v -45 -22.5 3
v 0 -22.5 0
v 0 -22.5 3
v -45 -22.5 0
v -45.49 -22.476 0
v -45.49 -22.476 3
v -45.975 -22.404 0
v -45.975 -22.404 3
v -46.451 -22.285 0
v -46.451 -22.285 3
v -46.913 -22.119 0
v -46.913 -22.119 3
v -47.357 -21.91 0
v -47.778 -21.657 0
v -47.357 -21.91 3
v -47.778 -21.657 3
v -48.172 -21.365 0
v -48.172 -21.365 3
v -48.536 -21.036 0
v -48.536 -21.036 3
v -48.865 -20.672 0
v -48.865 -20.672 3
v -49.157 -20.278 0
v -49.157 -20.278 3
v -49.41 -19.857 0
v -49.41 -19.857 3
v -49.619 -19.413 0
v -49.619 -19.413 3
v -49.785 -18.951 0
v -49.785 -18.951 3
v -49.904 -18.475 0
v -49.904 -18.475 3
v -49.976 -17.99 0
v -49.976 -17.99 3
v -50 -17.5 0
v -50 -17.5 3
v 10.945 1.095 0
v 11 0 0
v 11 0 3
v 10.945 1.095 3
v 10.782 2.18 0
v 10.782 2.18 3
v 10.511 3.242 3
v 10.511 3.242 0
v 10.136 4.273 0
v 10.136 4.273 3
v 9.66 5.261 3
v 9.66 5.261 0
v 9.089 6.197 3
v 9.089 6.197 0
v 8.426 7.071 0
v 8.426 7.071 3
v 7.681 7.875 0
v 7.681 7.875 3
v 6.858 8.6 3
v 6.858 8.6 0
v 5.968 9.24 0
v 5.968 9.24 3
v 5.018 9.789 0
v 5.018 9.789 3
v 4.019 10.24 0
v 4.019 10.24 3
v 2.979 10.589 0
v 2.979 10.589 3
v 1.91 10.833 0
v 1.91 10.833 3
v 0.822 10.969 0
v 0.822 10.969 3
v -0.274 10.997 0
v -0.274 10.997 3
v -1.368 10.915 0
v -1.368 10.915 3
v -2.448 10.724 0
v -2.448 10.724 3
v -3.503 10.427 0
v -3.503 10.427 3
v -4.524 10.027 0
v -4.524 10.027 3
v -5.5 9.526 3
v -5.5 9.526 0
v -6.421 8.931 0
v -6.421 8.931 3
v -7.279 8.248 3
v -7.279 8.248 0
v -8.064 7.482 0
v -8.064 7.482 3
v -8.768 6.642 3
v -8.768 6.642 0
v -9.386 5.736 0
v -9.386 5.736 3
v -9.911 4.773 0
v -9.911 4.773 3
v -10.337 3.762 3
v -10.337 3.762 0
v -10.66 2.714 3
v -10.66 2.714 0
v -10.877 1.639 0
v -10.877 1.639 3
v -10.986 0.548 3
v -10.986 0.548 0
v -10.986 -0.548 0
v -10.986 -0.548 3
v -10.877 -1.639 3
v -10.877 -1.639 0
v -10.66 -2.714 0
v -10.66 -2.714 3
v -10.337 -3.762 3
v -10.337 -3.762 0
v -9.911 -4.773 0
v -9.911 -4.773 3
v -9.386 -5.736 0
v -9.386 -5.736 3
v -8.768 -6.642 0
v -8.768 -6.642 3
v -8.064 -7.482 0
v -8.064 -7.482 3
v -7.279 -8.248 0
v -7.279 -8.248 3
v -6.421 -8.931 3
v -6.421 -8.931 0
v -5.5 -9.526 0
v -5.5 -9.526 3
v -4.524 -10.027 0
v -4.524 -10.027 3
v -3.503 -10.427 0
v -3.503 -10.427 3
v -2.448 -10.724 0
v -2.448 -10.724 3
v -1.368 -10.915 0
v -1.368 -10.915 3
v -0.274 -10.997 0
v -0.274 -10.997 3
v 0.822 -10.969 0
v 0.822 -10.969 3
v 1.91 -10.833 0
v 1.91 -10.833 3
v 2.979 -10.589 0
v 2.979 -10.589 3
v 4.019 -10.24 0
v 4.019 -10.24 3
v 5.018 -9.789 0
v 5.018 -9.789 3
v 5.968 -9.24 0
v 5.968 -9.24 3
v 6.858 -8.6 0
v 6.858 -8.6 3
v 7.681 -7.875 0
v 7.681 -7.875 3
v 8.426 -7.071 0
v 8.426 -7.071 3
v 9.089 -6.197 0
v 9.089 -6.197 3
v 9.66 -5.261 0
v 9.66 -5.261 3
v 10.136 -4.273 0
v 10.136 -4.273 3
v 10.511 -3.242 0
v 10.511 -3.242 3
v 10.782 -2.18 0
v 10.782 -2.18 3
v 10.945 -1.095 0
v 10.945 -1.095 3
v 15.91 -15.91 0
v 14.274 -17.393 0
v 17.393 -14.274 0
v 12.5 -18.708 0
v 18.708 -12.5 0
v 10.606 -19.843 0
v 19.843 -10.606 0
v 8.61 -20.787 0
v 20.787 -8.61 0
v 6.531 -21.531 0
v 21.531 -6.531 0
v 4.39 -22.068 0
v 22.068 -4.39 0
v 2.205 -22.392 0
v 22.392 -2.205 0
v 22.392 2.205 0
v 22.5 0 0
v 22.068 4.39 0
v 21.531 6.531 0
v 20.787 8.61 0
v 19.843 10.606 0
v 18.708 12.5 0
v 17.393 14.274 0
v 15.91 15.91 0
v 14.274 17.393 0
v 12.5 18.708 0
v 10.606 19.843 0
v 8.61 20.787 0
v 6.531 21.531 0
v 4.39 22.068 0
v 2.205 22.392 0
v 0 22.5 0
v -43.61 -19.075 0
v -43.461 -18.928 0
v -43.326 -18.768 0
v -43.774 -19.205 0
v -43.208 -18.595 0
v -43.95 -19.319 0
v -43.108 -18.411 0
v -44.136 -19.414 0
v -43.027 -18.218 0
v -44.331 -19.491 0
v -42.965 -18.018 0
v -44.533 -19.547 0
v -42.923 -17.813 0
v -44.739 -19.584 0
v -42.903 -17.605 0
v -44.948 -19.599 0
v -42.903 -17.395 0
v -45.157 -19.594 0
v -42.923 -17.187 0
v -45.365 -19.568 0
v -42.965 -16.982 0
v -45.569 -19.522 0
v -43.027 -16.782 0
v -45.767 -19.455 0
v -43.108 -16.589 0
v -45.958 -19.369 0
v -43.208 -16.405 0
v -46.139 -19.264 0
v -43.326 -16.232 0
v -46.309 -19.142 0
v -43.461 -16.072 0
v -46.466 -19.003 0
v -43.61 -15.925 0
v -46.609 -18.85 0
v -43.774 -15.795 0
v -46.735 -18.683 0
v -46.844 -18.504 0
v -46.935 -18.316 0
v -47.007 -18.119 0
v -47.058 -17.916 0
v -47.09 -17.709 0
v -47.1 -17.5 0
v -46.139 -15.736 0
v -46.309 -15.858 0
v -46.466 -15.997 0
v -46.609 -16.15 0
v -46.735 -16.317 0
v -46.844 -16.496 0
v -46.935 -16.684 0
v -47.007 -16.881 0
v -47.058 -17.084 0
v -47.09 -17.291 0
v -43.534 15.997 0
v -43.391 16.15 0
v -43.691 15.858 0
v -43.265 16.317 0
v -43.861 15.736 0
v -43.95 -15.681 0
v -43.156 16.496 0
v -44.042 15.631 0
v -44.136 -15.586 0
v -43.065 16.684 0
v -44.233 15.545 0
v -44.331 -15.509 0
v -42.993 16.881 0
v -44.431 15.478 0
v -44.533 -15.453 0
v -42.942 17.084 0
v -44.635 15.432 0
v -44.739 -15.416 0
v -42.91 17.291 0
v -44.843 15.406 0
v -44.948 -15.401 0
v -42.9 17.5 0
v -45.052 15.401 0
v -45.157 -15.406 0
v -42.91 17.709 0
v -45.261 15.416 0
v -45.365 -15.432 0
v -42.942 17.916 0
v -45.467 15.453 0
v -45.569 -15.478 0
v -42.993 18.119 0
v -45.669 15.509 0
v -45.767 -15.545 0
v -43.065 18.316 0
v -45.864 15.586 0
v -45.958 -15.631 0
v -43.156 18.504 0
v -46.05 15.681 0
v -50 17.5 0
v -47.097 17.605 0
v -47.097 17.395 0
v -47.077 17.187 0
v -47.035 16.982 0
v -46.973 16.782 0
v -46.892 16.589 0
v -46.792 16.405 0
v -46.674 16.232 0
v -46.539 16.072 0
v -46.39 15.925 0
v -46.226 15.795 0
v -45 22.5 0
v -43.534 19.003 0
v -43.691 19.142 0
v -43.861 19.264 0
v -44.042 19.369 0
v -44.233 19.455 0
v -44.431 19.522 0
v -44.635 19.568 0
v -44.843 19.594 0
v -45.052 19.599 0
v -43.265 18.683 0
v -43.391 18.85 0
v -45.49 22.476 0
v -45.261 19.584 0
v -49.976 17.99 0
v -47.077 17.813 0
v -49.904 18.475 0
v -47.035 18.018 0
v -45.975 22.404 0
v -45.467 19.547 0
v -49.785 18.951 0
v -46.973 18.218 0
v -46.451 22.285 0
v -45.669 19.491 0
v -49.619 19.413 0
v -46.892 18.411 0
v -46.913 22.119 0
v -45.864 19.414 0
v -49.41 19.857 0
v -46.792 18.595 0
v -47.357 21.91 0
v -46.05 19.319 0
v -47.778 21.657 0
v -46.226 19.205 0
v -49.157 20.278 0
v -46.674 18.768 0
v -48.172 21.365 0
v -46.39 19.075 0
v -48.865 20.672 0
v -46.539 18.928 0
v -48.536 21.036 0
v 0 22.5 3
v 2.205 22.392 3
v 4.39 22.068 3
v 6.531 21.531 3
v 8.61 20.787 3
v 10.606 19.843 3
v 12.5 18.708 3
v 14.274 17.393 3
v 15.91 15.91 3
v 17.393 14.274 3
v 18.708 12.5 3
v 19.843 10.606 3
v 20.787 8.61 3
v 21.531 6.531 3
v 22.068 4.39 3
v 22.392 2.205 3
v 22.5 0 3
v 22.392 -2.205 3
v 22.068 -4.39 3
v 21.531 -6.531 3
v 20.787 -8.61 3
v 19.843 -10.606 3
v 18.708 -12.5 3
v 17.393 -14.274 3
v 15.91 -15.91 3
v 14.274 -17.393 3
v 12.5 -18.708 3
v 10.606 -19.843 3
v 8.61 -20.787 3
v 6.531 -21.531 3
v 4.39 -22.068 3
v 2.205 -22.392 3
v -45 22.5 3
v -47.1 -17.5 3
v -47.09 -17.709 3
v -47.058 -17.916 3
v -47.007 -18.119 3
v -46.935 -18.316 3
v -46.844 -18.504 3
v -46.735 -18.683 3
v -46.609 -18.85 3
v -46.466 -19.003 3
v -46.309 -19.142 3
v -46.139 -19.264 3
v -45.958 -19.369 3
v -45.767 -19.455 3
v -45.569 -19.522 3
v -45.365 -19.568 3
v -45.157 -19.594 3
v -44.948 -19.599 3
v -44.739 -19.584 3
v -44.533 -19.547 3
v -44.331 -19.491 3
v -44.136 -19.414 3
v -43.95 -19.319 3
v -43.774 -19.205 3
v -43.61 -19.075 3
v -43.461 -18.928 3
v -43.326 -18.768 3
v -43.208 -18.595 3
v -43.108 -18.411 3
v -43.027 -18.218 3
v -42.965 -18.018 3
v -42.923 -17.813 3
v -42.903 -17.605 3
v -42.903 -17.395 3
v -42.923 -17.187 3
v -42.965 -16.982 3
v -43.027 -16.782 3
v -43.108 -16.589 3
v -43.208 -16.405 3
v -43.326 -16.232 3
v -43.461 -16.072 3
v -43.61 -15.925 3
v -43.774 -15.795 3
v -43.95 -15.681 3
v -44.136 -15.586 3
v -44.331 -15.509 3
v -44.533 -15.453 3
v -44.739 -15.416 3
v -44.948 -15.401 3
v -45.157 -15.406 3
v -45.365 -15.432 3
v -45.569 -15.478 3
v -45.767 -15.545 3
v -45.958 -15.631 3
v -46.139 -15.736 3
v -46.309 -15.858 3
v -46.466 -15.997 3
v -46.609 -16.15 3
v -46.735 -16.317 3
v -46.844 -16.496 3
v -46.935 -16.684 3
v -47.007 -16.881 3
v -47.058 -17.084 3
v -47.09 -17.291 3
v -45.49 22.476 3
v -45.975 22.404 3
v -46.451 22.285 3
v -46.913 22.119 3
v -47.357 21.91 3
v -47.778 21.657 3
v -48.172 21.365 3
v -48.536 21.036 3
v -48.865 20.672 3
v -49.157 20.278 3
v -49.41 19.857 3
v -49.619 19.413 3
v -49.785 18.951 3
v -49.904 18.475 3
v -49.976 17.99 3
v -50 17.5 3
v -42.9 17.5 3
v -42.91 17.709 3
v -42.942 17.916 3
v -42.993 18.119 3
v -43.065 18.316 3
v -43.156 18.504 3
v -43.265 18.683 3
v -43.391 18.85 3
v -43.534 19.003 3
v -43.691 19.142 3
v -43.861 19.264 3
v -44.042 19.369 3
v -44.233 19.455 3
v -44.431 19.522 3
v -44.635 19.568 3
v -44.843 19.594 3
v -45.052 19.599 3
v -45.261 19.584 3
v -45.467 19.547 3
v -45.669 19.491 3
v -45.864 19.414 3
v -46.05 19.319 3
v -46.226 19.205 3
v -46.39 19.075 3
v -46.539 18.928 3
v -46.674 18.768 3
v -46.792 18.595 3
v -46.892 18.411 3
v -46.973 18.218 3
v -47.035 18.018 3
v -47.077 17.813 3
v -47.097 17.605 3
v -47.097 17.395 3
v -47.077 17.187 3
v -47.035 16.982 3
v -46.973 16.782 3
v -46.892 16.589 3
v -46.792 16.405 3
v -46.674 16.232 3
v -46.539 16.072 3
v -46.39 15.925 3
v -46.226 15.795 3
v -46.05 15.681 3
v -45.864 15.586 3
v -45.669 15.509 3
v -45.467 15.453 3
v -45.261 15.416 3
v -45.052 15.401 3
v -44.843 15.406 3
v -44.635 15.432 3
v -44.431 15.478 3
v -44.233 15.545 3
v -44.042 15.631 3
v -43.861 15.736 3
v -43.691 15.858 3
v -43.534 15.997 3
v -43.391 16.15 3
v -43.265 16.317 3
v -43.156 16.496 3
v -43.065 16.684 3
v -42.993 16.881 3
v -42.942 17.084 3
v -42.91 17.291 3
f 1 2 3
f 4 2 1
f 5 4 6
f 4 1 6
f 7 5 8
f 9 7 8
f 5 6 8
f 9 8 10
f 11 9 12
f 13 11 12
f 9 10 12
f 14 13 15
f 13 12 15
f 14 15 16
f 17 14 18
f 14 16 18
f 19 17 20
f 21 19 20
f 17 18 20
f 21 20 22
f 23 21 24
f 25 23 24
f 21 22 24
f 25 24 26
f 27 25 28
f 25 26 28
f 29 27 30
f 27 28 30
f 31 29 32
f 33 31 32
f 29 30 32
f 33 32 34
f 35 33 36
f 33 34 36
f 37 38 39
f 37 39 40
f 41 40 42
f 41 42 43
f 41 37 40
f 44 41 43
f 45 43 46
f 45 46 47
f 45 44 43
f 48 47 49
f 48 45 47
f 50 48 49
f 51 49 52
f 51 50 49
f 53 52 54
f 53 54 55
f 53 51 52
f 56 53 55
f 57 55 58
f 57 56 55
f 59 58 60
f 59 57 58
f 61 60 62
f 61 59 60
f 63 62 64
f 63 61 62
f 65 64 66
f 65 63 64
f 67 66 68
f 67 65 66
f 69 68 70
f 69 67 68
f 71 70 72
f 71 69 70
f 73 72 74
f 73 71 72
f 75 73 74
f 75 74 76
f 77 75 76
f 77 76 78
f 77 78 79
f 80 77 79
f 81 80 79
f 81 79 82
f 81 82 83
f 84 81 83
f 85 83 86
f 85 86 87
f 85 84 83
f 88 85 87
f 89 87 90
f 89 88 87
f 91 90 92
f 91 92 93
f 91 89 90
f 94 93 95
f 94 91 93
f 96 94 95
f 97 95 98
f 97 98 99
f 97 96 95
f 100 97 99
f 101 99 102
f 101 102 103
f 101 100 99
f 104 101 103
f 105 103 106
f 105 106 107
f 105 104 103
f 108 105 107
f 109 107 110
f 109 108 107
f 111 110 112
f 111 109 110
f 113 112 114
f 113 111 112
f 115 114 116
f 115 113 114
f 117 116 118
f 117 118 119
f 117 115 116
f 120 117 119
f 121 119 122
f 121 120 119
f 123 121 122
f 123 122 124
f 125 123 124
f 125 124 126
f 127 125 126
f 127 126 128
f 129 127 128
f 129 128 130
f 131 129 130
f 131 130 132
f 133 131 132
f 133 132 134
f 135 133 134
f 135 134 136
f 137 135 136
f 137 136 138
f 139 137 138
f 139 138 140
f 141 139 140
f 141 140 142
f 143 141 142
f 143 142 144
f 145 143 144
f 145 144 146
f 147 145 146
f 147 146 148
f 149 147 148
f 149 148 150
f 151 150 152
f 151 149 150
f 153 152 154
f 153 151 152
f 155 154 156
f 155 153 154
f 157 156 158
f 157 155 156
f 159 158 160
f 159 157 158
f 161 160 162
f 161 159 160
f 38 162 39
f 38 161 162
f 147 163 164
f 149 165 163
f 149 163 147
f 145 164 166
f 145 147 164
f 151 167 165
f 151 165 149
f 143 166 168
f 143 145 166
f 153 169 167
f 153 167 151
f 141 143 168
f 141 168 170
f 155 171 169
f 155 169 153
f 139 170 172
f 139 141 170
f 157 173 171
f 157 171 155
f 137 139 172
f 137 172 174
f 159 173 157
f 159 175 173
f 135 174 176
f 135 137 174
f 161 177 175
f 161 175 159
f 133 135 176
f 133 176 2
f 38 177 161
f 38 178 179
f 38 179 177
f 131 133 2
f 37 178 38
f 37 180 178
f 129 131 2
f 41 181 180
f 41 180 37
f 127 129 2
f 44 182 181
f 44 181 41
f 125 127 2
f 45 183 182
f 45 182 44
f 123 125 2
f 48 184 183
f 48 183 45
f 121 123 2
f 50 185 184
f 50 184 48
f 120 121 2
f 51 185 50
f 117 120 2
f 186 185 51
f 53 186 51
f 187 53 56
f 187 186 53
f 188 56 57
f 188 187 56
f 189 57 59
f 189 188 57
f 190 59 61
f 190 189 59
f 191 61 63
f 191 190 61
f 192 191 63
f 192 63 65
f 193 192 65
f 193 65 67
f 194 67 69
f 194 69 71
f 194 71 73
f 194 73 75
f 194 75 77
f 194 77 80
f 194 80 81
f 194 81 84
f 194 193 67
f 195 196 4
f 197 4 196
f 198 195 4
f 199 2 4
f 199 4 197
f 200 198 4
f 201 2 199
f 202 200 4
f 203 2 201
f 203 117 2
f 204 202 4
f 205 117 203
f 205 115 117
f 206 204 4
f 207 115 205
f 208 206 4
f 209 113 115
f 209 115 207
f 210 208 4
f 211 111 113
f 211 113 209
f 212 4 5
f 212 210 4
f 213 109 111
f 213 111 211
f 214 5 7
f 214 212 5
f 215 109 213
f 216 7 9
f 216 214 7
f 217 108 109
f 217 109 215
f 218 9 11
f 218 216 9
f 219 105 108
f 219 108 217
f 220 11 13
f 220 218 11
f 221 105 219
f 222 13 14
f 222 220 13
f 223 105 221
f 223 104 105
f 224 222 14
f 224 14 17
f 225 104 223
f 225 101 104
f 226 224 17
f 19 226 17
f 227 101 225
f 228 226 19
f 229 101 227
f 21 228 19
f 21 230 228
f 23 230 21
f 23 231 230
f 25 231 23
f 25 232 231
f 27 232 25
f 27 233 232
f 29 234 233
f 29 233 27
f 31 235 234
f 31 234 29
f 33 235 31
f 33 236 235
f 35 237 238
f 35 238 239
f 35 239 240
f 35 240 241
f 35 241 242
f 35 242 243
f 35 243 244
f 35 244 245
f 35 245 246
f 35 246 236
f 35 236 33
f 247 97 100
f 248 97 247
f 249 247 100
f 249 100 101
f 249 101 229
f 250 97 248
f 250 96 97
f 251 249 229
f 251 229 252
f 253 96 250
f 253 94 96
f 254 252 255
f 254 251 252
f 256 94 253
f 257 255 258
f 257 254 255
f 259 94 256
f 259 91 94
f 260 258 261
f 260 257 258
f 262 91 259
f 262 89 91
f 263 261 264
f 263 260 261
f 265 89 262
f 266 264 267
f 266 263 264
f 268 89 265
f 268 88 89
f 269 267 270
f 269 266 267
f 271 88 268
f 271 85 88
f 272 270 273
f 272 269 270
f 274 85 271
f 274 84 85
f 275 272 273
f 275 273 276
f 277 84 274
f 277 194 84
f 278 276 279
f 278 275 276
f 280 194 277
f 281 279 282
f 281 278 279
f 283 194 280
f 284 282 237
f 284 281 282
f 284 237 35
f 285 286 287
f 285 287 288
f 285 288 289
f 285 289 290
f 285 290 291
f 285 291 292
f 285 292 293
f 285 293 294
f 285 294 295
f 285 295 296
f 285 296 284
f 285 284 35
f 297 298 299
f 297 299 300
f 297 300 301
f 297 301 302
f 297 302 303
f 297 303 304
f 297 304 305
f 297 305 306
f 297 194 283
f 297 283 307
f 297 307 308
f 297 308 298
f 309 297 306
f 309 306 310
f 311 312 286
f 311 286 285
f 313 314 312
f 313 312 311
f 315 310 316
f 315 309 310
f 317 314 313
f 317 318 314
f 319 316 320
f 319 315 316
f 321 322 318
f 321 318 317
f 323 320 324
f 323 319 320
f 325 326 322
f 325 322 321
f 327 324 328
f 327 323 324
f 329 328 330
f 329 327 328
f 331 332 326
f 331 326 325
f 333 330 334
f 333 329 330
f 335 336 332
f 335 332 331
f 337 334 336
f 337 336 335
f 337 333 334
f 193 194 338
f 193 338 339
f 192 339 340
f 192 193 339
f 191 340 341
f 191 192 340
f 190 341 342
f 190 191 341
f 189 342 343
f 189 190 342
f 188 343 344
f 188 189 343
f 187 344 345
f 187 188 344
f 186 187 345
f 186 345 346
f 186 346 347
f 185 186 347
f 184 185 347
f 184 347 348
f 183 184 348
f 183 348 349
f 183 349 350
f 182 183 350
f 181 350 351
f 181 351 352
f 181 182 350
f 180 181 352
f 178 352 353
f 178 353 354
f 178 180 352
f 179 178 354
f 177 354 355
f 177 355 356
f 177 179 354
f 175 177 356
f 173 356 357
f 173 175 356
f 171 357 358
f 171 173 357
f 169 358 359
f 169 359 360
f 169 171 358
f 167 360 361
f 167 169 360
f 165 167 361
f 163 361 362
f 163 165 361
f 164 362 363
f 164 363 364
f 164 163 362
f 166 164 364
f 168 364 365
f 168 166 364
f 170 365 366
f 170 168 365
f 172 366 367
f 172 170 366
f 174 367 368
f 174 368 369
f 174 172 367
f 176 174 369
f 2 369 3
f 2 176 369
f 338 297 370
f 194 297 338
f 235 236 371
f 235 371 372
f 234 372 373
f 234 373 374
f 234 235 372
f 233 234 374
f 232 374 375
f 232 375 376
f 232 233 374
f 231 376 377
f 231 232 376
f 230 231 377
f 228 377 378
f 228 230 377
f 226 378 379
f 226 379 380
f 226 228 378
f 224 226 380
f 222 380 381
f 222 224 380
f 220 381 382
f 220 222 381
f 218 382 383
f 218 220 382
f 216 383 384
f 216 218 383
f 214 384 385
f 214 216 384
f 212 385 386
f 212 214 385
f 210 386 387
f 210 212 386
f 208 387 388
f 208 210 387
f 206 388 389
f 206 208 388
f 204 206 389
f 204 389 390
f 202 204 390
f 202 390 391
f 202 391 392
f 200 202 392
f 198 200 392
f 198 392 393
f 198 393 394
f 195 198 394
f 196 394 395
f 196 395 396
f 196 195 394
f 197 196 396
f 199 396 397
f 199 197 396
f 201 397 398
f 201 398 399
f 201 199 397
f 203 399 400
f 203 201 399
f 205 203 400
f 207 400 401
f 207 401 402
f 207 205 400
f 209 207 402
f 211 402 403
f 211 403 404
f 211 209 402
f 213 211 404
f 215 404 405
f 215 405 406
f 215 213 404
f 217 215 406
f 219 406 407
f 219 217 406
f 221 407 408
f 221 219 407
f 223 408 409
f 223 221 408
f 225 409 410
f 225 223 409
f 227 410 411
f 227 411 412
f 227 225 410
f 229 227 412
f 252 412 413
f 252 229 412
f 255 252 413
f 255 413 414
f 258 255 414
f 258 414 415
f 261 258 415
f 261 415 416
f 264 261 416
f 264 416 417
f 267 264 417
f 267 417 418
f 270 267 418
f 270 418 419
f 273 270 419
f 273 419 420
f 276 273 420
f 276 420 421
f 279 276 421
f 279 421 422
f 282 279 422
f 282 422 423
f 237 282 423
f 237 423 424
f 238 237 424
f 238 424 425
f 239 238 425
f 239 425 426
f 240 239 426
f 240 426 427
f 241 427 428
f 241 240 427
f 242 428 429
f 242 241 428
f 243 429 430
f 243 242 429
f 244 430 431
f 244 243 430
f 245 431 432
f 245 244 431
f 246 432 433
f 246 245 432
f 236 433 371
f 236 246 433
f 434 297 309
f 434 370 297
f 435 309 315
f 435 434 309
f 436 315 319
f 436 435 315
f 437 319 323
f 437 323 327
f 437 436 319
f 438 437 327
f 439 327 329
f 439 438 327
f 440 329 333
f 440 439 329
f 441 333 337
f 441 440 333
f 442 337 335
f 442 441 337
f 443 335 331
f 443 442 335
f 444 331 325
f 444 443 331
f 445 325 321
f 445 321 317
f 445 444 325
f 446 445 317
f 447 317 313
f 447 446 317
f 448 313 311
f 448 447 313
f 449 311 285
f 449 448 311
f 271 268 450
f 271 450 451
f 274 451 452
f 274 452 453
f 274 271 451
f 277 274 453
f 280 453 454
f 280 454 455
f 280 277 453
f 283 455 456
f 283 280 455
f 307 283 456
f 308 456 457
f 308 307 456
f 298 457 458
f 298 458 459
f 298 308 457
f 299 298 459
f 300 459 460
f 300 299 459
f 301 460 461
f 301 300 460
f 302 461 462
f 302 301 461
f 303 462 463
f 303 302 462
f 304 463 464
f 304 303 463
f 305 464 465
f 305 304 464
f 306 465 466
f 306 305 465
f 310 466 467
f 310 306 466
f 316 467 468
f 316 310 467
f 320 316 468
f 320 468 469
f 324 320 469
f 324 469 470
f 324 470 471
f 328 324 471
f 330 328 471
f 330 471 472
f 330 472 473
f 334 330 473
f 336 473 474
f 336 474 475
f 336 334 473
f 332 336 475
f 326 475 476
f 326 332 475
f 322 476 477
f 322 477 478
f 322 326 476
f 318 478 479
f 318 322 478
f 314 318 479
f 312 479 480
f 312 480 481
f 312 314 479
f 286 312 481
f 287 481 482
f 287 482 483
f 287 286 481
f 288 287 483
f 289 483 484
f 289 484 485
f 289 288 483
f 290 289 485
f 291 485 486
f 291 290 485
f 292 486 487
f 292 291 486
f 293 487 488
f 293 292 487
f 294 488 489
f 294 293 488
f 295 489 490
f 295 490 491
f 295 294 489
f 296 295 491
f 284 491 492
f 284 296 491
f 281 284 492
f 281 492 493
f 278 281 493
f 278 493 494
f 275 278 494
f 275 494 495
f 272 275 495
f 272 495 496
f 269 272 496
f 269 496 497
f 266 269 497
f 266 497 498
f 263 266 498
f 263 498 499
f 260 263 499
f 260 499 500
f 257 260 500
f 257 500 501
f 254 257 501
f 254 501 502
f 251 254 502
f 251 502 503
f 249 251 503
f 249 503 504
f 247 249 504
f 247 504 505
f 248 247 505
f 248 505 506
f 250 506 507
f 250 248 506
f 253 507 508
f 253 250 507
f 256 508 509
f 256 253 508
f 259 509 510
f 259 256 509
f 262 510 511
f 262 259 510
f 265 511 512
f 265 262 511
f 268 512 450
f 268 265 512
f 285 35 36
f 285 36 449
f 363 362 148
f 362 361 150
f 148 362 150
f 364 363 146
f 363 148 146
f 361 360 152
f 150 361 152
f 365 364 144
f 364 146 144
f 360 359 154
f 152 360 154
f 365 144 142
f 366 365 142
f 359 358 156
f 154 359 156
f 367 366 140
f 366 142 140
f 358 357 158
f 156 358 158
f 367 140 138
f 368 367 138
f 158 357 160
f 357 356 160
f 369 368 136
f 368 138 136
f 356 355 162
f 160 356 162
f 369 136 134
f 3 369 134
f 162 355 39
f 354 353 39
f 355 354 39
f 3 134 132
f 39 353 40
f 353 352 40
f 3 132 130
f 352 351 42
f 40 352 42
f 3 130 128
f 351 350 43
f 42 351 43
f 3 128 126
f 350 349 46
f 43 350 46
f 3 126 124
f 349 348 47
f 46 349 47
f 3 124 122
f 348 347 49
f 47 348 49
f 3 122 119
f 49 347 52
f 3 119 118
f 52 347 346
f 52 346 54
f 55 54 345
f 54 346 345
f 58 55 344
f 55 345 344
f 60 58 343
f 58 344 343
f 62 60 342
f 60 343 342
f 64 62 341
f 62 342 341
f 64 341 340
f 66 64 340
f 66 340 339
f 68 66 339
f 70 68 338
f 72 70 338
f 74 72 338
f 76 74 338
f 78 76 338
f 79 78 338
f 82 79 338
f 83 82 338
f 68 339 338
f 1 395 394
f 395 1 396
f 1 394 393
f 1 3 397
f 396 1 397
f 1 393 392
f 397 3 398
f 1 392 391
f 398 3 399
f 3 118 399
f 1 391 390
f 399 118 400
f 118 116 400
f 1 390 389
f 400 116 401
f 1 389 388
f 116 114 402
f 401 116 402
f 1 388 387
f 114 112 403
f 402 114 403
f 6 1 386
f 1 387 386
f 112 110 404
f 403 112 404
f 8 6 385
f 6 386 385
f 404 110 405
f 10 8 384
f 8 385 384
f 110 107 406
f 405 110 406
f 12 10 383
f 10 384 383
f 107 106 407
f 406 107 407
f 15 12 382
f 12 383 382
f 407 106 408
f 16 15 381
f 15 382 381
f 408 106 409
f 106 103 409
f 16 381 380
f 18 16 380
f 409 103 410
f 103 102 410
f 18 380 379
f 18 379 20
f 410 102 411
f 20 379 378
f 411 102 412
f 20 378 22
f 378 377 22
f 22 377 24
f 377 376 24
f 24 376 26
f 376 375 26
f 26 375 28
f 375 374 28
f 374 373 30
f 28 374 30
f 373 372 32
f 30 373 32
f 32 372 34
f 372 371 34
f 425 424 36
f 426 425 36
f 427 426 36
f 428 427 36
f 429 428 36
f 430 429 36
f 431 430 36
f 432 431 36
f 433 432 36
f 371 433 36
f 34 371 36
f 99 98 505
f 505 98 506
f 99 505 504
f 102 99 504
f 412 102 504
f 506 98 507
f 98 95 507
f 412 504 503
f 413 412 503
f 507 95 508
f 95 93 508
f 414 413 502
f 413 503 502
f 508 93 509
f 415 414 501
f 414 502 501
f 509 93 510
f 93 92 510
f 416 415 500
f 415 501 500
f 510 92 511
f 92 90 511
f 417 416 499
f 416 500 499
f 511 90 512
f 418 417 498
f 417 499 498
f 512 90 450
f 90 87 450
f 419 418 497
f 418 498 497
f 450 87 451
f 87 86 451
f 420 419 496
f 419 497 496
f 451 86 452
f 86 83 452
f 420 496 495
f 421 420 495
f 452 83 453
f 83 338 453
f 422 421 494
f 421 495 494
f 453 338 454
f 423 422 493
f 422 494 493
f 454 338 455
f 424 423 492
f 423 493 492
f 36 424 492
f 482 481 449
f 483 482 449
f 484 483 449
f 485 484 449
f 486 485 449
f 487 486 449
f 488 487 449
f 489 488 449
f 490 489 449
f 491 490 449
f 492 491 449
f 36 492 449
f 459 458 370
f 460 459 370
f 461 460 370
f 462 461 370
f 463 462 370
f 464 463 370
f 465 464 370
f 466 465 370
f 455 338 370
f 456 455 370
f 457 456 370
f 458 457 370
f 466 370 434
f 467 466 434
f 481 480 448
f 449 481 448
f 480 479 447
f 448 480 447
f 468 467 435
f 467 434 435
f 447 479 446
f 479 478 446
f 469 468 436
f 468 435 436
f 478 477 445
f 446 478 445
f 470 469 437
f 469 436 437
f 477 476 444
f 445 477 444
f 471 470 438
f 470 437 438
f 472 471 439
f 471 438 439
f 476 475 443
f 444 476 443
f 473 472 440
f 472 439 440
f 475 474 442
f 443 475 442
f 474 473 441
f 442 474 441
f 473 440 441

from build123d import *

# Parameters (mm, degrees)
SKETCH_1_R      = 11
SKETCH_1_R_2    = 2.1
EXTRUDE_1_DEPTH = 3
FILLET_1_R      = 5


with BuildPart() as part:
    # ｽｹｯﾁ1 → ﾎﾞｽ - 押し出し1 (new body)
    with BuildSketch(Plane.XY):
        with BuildLine():
            Line((-40, 22.5), (0, 22.5))
            ThreePointArc((0, 22.5), (22.5, 0), (0, -22.5))
            Line((0, -22.5), (-40, -22.5))
            Line((-40, -22.5), (-50, -22.5))
            Line((-50, -22.5), (-50, 22.5))
            Line((-50, 22.5), (-40, 22.5))
        make_face()
        Circle(SKETCH_1_R, mode=Mode.SUBTRACT)
        with Locations((-45, 17.5)):
            Circle(SKETCH_1_R_2, mode=Mode.SUBTRACT)
        with Locations(Location((-45, -17.5, 0), (0, 0, 180))):
            Circle(SKETCH_1_R_2, mode=Mode.SUBTRACT)
    extrude(amount=EXTRUDE_1_DEPTH)

    # ﾌｨﾚｯﾄ1
    fillet_1_edges = [part.edges().sort_by_distance(p)[0] for p in [
        (-50, -22.5, 1.5),
        (-50, 22.5, 1.5),
    ]]
    fillet(fillet_1_edges, radius=FILLET_1_R)


solid = part.part
